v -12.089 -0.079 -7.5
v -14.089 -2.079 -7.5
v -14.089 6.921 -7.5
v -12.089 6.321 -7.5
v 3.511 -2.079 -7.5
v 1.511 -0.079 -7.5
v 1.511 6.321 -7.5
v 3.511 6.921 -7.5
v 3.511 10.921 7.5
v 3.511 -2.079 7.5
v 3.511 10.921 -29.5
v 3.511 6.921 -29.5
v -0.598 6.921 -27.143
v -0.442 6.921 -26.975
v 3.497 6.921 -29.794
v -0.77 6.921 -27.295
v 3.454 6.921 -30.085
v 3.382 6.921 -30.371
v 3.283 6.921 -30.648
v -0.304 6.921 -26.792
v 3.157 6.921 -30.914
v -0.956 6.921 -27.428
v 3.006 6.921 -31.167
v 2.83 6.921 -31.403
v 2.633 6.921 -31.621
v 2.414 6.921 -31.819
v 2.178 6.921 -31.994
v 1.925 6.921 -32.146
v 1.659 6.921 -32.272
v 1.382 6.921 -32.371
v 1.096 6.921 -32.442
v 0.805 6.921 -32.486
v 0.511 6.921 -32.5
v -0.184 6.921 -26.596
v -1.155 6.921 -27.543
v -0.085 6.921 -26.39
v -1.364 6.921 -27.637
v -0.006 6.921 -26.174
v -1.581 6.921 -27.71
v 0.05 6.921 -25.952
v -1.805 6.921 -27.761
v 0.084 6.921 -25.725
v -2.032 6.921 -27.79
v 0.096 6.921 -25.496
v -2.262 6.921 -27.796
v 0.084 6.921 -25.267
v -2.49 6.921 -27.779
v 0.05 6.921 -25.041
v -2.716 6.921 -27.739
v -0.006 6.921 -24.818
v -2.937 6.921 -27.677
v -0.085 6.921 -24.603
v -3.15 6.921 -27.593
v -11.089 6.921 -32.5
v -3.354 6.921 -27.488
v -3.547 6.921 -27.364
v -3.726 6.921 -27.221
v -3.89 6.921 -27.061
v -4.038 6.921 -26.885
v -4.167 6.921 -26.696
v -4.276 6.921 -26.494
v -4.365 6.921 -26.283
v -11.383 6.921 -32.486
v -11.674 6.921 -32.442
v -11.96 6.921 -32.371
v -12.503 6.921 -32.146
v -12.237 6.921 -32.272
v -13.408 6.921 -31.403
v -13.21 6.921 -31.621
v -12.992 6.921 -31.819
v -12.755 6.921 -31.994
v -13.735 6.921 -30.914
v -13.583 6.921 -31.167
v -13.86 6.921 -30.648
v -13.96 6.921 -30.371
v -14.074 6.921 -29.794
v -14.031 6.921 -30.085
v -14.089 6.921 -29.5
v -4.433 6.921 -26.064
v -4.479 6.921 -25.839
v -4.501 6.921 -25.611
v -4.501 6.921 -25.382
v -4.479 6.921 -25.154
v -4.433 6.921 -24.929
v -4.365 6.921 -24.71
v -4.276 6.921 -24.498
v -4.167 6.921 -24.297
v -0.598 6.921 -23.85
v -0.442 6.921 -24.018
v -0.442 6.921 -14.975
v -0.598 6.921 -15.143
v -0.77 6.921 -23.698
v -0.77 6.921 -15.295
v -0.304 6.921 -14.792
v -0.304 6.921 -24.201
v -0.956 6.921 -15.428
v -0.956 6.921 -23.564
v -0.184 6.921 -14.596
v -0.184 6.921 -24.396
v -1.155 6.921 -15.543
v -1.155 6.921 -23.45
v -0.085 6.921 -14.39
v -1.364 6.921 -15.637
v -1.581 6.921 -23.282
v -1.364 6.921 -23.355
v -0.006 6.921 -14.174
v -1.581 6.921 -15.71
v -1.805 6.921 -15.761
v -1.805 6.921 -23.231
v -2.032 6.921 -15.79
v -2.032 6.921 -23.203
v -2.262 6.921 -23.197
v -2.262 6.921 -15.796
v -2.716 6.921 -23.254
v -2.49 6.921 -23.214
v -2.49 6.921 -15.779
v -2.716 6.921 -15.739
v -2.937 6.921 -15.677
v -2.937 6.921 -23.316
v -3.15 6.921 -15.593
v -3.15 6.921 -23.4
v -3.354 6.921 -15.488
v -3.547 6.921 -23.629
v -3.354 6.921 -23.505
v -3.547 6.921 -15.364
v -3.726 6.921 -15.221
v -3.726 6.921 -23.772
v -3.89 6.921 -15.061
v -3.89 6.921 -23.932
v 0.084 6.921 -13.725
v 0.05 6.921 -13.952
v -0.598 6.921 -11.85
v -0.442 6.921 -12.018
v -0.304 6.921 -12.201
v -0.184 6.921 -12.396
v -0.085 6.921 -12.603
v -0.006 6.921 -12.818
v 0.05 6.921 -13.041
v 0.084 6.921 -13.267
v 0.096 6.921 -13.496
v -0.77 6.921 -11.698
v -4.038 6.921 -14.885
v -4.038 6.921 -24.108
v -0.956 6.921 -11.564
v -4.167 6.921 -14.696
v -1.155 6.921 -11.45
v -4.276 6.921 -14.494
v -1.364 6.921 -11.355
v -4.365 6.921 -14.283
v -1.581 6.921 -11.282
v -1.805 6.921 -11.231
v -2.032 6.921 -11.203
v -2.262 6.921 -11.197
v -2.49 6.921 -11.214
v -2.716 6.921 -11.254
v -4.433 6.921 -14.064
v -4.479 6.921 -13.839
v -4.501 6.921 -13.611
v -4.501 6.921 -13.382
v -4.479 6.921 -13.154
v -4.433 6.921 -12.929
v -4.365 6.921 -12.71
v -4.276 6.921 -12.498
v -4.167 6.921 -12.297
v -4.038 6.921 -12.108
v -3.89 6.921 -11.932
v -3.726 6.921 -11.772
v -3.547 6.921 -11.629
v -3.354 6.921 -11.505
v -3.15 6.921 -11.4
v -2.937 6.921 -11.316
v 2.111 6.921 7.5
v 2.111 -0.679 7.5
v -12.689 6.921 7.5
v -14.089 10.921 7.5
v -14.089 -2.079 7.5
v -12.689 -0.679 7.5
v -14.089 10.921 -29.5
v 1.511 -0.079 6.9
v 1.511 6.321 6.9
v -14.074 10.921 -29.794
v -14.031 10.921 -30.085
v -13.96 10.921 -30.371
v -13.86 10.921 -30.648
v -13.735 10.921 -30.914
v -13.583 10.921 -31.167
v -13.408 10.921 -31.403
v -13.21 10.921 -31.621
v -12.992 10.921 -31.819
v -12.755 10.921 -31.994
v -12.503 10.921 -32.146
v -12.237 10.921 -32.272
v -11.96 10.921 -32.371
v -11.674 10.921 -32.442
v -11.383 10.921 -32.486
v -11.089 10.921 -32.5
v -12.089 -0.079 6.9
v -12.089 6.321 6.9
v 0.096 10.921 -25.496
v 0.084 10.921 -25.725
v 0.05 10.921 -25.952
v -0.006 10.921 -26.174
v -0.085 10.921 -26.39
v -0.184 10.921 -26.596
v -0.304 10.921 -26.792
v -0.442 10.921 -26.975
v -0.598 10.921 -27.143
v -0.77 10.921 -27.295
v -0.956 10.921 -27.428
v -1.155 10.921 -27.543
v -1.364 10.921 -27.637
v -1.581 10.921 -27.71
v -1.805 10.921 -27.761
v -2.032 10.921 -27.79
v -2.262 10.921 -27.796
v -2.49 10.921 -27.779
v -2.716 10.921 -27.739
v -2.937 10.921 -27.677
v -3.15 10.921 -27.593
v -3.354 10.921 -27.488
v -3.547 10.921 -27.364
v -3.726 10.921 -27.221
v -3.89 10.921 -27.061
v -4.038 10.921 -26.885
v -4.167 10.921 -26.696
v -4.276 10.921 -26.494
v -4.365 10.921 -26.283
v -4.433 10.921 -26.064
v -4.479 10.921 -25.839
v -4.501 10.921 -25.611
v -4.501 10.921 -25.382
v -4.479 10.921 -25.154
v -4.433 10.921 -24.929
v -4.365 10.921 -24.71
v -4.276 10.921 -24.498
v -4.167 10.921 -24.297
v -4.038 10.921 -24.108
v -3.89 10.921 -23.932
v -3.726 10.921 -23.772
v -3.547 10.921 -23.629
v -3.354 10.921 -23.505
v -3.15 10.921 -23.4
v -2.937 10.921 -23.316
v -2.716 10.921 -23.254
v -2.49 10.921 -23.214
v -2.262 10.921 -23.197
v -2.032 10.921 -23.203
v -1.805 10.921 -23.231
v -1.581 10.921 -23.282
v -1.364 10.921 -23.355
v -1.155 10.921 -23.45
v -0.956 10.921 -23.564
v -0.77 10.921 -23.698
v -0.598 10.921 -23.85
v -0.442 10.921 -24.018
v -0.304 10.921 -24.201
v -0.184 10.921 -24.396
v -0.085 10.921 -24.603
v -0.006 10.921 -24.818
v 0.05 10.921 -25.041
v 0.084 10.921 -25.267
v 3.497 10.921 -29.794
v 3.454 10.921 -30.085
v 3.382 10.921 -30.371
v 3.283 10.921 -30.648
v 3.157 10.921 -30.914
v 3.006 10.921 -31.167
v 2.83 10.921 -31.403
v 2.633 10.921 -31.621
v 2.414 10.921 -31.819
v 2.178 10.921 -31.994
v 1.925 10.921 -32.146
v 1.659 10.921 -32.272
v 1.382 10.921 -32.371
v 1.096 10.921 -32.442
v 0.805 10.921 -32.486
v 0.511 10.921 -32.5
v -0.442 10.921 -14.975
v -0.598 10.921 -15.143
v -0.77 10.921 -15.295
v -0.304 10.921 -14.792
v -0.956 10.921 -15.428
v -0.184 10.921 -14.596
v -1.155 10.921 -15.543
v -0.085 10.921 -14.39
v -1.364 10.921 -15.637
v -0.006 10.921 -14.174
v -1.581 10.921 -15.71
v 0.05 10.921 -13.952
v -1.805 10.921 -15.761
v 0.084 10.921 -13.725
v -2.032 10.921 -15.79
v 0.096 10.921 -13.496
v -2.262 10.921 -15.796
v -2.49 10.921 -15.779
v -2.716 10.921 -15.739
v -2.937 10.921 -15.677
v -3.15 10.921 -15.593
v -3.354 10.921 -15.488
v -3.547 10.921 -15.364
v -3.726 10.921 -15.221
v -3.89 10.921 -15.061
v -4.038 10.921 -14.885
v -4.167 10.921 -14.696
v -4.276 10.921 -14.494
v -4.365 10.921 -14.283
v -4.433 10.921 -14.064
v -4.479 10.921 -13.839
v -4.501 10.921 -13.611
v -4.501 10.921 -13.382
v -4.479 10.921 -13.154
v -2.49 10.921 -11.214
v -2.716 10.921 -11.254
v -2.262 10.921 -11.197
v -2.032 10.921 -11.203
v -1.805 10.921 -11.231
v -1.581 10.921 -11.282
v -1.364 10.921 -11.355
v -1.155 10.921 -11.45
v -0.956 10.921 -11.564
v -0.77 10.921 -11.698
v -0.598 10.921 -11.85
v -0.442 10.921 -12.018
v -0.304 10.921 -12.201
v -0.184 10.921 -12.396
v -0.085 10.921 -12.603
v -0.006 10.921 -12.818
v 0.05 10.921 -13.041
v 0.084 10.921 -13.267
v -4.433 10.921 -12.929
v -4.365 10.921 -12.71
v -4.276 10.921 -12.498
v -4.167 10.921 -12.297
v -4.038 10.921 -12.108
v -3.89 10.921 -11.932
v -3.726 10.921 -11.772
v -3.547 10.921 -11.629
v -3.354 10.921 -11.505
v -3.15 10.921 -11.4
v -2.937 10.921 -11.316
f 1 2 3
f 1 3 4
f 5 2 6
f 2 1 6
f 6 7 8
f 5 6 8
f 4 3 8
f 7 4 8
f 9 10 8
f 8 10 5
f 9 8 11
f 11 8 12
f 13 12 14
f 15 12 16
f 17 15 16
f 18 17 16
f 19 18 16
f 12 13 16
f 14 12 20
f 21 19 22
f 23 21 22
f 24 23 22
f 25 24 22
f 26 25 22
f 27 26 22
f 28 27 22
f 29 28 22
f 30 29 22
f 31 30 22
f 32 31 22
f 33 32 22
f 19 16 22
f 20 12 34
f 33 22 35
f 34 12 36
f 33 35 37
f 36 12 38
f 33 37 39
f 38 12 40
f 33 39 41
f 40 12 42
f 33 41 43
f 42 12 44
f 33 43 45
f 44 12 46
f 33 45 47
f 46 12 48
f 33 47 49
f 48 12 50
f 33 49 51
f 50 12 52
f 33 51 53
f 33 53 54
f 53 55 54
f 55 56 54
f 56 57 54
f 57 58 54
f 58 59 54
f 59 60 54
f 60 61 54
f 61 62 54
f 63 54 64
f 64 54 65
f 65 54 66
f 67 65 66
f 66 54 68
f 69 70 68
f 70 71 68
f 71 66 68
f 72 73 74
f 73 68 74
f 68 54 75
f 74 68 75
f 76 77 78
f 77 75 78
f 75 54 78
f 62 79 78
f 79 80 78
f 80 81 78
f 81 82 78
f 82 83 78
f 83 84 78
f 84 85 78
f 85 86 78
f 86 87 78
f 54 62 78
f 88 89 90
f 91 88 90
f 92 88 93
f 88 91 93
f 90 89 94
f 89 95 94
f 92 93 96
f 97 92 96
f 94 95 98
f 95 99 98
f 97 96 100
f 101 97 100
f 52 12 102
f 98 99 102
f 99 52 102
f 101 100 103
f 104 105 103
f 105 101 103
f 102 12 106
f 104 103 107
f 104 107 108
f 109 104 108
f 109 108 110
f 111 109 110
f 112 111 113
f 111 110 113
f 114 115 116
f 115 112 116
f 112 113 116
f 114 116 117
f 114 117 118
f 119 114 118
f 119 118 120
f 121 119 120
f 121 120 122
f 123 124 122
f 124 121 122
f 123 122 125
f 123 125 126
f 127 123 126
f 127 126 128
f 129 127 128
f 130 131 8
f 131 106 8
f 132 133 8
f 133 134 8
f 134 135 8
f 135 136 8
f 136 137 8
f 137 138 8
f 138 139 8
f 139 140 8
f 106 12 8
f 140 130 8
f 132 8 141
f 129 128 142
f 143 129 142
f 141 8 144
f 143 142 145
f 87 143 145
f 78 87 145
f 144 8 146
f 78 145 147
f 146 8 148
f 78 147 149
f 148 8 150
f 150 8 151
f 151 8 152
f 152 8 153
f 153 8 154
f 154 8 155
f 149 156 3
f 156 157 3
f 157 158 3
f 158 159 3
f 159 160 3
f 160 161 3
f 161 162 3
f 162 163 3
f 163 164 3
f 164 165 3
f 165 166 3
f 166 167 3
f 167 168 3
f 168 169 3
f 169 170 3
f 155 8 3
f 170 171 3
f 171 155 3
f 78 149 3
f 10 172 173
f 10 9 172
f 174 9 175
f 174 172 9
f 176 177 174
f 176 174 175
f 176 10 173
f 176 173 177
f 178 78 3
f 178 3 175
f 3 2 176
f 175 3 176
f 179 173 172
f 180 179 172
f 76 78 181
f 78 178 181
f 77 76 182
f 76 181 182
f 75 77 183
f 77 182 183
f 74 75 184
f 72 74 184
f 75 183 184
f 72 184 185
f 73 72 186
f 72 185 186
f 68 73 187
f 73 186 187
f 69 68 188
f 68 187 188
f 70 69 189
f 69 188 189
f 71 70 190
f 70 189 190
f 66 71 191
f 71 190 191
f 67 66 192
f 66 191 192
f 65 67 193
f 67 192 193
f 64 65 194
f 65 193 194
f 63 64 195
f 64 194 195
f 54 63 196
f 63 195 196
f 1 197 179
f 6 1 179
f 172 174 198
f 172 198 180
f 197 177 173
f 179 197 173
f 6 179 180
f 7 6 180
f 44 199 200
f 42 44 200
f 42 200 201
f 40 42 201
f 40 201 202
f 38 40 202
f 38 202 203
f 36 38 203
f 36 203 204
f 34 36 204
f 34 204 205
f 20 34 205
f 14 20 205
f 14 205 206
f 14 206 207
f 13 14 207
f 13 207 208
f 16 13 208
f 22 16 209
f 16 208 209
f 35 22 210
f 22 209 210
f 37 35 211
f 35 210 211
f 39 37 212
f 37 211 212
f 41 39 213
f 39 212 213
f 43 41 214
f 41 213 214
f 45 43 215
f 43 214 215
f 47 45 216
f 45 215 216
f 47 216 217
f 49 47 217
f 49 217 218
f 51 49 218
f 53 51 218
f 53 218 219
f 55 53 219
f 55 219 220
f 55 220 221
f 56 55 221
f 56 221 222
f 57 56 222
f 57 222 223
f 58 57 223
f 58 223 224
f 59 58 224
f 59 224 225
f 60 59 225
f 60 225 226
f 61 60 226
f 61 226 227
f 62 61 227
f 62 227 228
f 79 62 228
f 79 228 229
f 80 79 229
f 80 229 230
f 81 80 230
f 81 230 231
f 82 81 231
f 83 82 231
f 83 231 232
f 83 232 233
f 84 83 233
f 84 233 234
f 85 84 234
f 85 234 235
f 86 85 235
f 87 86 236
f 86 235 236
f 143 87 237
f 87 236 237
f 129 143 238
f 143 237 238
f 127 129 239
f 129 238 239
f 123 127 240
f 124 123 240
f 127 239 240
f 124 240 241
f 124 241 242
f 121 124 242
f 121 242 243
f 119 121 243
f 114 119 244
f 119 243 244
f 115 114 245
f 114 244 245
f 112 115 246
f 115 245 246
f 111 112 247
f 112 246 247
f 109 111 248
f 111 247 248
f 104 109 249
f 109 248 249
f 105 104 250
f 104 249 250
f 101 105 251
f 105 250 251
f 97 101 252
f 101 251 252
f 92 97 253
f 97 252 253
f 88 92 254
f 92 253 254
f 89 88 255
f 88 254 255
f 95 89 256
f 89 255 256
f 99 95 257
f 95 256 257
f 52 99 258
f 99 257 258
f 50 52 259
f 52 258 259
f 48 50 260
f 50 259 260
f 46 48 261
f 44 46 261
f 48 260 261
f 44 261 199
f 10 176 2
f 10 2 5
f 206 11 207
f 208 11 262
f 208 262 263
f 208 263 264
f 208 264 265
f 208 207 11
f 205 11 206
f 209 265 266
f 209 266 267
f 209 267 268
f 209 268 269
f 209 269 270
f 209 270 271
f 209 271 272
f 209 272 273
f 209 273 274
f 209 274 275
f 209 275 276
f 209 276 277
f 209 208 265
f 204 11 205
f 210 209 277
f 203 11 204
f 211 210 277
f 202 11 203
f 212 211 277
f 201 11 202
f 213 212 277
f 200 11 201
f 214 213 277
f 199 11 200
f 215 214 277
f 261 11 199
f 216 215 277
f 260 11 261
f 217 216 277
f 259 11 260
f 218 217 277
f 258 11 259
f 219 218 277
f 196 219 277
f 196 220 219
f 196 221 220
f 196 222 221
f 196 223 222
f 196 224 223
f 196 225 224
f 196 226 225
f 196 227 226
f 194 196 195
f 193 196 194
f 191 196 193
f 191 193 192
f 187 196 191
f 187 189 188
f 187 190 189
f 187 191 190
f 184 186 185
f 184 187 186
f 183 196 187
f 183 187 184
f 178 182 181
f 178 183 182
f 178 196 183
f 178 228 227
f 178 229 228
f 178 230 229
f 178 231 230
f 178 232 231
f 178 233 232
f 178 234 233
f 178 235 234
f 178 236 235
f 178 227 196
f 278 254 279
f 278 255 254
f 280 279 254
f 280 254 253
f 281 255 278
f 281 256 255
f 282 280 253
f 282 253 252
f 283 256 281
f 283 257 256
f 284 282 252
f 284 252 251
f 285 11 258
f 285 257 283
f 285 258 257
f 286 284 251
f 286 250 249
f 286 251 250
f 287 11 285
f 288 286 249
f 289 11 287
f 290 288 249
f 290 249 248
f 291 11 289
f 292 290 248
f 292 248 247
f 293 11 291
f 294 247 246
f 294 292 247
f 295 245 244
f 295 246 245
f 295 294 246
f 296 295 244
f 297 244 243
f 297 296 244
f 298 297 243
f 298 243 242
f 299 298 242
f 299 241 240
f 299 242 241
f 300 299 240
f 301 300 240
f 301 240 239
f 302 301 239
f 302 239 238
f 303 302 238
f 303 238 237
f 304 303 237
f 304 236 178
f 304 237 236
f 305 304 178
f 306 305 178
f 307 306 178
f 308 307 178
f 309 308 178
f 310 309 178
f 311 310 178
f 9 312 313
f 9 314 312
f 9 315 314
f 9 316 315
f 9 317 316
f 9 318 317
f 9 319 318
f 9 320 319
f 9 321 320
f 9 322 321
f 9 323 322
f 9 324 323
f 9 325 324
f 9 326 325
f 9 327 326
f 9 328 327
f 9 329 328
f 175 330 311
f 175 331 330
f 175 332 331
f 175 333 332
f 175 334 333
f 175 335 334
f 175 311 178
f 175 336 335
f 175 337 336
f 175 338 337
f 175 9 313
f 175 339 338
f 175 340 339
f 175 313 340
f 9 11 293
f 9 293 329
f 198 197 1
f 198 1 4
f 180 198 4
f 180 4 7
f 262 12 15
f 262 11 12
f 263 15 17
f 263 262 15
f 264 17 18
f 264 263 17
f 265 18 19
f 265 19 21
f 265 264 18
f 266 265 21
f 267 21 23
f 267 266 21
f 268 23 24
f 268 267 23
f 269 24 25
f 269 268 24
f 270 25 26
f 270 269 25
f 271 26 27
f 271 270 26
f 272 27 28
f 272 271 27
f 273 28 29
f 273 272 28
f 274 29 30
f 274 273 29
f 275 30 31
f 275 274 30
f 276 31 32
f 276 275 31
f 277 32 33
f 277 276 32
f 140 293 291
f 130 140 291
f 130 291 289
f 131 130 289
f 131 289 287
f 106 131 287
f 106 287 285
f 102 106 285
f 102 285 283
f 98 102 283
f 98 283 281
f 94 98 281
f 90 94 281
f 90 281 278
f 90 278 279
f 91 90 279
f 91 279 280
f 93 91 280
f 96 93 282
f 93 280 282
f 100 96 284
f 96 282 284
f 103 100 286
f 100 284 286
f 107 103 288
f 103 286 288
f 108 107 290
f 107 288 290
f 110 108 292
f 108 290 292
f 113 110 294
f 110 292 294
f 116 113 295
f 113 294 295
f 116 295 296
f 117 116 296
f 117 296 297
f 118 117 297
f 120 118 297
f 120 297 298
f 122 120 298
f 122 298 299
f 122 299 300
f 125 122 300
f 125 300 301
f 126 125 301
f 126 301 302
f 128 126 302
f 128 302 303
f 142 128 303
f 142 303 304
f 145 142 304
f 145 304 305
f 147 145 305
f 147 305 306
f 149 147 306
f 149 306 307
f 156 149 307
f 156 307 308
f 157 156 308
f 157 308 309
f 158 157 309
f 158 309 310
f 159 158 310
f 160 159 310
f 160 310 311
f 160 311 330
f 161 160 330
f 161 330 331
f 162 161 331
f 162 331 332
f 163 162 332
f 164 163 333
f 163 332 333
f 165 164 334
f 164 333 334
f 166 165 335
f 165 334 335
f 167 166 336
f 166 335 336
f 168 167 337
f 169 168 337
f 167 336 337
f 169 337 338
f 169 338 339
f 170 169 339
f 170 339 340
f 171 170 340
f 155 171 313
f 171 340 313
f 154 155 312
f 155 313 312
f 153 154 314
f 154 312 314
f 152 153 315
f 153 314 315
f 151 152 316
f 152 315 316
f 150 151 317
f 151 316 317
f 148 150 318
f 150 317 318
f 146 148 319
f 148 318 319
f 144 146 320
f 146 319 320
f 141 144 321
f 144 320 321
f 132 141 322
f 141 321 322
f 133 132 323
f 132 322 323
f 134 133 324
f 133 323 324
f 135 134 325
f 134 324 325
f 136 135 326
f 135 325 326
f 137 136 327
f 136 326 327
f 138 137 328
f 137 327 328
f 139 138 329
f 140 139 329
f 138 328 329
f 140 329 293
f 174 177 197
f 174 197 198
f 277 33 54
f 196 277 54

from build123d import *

# Parameters (mm, degrees)
F0_W     = 17.6
F0_H     = 9
F0_W_2   = 13.6
F0_H_2   = 6.4
F1_DEPTH = 7.5
F2_W     = 17.6
F2_H     = 15
F2_H_2   = 25
F3_DEPTH = 4
F4_SIZE  = 0.6
F5_D     = 4.6
F5_DEPTH = 10
F5_TIP   = 1.3819794238
F6_R     = 3


# Not quite as in the source:
# - a feature names something its author has since deleted; it is built from what else it names


with BuildPart() as f1:
    # F0 (on Top) → F1 (new body, symmetric)
    with BuildSketch(Plane.XY):
        with Locations((-5.2887722373, 2.4212898893)):
            Rectangle(F0_W, F0_H)
        with Locations((-5.2887722373, 3.1212898893)):
            Rectangle(F0_W_2, F0_H_2, mode=Mode.SUBTRACT)
    extrude(amount=F1_DEPTH, both=True)

    # F2 (on face) → F3 (join)
    with BuildSketch(Plane(origin=(0, 6.9212898893, 0), x_dir=(-1, 0, 0), z_dir=(0, 1, 0))):
        with Locations((5.2887722373, 0)):
            Rectangle(F2_W, F2_H)
        with Locations((5.2887722373, -20)):
            Rectangle(F2_W, F2_H_2)
    extrude(amount=F3_DEPTH)

    # F4
    f4_edges = [f1.edges().sort_by_distance(p)[0] for p in [
        (-5.288772, 6.32129, 7.5),
        (1.511228, 3.12129, 7.5),
        (-12.088772, 3.12129, 7.5),
        (-5.288772, -0.07871, 7.5),
    ]]
    chamfer(f4_edges, length=F4_SIZE)

    # F5
    with Locations(Plane(origin=(0, 6.9212898893, 0), x_dir=(-1, 0, 0), z_dir=(0, -1, 0))):
        with Locations((2.2041960619, 25.4963655025), (2.2041960619, 13.4963655025)):
            Hole(F5_D / 2, depth=F5_DEPTH)
            with Locations((0, 0, -(F5_DEPTH + F5_TIP / 2))):  # 118° drill point
                Cone(0, F5_D / 2, F5_TIP, mode=Mode.SUBTRACT)

    # F6
    f6_edges = [f1.edges().sort_by_distance(p)[0] for p in [
        (3.511228, 8.92129, -32.5),
        (-14.088772, 8.92129, -32.5),
    ]]
    fillet(f6_edges, radius=F6_R)


solid = f1.part
